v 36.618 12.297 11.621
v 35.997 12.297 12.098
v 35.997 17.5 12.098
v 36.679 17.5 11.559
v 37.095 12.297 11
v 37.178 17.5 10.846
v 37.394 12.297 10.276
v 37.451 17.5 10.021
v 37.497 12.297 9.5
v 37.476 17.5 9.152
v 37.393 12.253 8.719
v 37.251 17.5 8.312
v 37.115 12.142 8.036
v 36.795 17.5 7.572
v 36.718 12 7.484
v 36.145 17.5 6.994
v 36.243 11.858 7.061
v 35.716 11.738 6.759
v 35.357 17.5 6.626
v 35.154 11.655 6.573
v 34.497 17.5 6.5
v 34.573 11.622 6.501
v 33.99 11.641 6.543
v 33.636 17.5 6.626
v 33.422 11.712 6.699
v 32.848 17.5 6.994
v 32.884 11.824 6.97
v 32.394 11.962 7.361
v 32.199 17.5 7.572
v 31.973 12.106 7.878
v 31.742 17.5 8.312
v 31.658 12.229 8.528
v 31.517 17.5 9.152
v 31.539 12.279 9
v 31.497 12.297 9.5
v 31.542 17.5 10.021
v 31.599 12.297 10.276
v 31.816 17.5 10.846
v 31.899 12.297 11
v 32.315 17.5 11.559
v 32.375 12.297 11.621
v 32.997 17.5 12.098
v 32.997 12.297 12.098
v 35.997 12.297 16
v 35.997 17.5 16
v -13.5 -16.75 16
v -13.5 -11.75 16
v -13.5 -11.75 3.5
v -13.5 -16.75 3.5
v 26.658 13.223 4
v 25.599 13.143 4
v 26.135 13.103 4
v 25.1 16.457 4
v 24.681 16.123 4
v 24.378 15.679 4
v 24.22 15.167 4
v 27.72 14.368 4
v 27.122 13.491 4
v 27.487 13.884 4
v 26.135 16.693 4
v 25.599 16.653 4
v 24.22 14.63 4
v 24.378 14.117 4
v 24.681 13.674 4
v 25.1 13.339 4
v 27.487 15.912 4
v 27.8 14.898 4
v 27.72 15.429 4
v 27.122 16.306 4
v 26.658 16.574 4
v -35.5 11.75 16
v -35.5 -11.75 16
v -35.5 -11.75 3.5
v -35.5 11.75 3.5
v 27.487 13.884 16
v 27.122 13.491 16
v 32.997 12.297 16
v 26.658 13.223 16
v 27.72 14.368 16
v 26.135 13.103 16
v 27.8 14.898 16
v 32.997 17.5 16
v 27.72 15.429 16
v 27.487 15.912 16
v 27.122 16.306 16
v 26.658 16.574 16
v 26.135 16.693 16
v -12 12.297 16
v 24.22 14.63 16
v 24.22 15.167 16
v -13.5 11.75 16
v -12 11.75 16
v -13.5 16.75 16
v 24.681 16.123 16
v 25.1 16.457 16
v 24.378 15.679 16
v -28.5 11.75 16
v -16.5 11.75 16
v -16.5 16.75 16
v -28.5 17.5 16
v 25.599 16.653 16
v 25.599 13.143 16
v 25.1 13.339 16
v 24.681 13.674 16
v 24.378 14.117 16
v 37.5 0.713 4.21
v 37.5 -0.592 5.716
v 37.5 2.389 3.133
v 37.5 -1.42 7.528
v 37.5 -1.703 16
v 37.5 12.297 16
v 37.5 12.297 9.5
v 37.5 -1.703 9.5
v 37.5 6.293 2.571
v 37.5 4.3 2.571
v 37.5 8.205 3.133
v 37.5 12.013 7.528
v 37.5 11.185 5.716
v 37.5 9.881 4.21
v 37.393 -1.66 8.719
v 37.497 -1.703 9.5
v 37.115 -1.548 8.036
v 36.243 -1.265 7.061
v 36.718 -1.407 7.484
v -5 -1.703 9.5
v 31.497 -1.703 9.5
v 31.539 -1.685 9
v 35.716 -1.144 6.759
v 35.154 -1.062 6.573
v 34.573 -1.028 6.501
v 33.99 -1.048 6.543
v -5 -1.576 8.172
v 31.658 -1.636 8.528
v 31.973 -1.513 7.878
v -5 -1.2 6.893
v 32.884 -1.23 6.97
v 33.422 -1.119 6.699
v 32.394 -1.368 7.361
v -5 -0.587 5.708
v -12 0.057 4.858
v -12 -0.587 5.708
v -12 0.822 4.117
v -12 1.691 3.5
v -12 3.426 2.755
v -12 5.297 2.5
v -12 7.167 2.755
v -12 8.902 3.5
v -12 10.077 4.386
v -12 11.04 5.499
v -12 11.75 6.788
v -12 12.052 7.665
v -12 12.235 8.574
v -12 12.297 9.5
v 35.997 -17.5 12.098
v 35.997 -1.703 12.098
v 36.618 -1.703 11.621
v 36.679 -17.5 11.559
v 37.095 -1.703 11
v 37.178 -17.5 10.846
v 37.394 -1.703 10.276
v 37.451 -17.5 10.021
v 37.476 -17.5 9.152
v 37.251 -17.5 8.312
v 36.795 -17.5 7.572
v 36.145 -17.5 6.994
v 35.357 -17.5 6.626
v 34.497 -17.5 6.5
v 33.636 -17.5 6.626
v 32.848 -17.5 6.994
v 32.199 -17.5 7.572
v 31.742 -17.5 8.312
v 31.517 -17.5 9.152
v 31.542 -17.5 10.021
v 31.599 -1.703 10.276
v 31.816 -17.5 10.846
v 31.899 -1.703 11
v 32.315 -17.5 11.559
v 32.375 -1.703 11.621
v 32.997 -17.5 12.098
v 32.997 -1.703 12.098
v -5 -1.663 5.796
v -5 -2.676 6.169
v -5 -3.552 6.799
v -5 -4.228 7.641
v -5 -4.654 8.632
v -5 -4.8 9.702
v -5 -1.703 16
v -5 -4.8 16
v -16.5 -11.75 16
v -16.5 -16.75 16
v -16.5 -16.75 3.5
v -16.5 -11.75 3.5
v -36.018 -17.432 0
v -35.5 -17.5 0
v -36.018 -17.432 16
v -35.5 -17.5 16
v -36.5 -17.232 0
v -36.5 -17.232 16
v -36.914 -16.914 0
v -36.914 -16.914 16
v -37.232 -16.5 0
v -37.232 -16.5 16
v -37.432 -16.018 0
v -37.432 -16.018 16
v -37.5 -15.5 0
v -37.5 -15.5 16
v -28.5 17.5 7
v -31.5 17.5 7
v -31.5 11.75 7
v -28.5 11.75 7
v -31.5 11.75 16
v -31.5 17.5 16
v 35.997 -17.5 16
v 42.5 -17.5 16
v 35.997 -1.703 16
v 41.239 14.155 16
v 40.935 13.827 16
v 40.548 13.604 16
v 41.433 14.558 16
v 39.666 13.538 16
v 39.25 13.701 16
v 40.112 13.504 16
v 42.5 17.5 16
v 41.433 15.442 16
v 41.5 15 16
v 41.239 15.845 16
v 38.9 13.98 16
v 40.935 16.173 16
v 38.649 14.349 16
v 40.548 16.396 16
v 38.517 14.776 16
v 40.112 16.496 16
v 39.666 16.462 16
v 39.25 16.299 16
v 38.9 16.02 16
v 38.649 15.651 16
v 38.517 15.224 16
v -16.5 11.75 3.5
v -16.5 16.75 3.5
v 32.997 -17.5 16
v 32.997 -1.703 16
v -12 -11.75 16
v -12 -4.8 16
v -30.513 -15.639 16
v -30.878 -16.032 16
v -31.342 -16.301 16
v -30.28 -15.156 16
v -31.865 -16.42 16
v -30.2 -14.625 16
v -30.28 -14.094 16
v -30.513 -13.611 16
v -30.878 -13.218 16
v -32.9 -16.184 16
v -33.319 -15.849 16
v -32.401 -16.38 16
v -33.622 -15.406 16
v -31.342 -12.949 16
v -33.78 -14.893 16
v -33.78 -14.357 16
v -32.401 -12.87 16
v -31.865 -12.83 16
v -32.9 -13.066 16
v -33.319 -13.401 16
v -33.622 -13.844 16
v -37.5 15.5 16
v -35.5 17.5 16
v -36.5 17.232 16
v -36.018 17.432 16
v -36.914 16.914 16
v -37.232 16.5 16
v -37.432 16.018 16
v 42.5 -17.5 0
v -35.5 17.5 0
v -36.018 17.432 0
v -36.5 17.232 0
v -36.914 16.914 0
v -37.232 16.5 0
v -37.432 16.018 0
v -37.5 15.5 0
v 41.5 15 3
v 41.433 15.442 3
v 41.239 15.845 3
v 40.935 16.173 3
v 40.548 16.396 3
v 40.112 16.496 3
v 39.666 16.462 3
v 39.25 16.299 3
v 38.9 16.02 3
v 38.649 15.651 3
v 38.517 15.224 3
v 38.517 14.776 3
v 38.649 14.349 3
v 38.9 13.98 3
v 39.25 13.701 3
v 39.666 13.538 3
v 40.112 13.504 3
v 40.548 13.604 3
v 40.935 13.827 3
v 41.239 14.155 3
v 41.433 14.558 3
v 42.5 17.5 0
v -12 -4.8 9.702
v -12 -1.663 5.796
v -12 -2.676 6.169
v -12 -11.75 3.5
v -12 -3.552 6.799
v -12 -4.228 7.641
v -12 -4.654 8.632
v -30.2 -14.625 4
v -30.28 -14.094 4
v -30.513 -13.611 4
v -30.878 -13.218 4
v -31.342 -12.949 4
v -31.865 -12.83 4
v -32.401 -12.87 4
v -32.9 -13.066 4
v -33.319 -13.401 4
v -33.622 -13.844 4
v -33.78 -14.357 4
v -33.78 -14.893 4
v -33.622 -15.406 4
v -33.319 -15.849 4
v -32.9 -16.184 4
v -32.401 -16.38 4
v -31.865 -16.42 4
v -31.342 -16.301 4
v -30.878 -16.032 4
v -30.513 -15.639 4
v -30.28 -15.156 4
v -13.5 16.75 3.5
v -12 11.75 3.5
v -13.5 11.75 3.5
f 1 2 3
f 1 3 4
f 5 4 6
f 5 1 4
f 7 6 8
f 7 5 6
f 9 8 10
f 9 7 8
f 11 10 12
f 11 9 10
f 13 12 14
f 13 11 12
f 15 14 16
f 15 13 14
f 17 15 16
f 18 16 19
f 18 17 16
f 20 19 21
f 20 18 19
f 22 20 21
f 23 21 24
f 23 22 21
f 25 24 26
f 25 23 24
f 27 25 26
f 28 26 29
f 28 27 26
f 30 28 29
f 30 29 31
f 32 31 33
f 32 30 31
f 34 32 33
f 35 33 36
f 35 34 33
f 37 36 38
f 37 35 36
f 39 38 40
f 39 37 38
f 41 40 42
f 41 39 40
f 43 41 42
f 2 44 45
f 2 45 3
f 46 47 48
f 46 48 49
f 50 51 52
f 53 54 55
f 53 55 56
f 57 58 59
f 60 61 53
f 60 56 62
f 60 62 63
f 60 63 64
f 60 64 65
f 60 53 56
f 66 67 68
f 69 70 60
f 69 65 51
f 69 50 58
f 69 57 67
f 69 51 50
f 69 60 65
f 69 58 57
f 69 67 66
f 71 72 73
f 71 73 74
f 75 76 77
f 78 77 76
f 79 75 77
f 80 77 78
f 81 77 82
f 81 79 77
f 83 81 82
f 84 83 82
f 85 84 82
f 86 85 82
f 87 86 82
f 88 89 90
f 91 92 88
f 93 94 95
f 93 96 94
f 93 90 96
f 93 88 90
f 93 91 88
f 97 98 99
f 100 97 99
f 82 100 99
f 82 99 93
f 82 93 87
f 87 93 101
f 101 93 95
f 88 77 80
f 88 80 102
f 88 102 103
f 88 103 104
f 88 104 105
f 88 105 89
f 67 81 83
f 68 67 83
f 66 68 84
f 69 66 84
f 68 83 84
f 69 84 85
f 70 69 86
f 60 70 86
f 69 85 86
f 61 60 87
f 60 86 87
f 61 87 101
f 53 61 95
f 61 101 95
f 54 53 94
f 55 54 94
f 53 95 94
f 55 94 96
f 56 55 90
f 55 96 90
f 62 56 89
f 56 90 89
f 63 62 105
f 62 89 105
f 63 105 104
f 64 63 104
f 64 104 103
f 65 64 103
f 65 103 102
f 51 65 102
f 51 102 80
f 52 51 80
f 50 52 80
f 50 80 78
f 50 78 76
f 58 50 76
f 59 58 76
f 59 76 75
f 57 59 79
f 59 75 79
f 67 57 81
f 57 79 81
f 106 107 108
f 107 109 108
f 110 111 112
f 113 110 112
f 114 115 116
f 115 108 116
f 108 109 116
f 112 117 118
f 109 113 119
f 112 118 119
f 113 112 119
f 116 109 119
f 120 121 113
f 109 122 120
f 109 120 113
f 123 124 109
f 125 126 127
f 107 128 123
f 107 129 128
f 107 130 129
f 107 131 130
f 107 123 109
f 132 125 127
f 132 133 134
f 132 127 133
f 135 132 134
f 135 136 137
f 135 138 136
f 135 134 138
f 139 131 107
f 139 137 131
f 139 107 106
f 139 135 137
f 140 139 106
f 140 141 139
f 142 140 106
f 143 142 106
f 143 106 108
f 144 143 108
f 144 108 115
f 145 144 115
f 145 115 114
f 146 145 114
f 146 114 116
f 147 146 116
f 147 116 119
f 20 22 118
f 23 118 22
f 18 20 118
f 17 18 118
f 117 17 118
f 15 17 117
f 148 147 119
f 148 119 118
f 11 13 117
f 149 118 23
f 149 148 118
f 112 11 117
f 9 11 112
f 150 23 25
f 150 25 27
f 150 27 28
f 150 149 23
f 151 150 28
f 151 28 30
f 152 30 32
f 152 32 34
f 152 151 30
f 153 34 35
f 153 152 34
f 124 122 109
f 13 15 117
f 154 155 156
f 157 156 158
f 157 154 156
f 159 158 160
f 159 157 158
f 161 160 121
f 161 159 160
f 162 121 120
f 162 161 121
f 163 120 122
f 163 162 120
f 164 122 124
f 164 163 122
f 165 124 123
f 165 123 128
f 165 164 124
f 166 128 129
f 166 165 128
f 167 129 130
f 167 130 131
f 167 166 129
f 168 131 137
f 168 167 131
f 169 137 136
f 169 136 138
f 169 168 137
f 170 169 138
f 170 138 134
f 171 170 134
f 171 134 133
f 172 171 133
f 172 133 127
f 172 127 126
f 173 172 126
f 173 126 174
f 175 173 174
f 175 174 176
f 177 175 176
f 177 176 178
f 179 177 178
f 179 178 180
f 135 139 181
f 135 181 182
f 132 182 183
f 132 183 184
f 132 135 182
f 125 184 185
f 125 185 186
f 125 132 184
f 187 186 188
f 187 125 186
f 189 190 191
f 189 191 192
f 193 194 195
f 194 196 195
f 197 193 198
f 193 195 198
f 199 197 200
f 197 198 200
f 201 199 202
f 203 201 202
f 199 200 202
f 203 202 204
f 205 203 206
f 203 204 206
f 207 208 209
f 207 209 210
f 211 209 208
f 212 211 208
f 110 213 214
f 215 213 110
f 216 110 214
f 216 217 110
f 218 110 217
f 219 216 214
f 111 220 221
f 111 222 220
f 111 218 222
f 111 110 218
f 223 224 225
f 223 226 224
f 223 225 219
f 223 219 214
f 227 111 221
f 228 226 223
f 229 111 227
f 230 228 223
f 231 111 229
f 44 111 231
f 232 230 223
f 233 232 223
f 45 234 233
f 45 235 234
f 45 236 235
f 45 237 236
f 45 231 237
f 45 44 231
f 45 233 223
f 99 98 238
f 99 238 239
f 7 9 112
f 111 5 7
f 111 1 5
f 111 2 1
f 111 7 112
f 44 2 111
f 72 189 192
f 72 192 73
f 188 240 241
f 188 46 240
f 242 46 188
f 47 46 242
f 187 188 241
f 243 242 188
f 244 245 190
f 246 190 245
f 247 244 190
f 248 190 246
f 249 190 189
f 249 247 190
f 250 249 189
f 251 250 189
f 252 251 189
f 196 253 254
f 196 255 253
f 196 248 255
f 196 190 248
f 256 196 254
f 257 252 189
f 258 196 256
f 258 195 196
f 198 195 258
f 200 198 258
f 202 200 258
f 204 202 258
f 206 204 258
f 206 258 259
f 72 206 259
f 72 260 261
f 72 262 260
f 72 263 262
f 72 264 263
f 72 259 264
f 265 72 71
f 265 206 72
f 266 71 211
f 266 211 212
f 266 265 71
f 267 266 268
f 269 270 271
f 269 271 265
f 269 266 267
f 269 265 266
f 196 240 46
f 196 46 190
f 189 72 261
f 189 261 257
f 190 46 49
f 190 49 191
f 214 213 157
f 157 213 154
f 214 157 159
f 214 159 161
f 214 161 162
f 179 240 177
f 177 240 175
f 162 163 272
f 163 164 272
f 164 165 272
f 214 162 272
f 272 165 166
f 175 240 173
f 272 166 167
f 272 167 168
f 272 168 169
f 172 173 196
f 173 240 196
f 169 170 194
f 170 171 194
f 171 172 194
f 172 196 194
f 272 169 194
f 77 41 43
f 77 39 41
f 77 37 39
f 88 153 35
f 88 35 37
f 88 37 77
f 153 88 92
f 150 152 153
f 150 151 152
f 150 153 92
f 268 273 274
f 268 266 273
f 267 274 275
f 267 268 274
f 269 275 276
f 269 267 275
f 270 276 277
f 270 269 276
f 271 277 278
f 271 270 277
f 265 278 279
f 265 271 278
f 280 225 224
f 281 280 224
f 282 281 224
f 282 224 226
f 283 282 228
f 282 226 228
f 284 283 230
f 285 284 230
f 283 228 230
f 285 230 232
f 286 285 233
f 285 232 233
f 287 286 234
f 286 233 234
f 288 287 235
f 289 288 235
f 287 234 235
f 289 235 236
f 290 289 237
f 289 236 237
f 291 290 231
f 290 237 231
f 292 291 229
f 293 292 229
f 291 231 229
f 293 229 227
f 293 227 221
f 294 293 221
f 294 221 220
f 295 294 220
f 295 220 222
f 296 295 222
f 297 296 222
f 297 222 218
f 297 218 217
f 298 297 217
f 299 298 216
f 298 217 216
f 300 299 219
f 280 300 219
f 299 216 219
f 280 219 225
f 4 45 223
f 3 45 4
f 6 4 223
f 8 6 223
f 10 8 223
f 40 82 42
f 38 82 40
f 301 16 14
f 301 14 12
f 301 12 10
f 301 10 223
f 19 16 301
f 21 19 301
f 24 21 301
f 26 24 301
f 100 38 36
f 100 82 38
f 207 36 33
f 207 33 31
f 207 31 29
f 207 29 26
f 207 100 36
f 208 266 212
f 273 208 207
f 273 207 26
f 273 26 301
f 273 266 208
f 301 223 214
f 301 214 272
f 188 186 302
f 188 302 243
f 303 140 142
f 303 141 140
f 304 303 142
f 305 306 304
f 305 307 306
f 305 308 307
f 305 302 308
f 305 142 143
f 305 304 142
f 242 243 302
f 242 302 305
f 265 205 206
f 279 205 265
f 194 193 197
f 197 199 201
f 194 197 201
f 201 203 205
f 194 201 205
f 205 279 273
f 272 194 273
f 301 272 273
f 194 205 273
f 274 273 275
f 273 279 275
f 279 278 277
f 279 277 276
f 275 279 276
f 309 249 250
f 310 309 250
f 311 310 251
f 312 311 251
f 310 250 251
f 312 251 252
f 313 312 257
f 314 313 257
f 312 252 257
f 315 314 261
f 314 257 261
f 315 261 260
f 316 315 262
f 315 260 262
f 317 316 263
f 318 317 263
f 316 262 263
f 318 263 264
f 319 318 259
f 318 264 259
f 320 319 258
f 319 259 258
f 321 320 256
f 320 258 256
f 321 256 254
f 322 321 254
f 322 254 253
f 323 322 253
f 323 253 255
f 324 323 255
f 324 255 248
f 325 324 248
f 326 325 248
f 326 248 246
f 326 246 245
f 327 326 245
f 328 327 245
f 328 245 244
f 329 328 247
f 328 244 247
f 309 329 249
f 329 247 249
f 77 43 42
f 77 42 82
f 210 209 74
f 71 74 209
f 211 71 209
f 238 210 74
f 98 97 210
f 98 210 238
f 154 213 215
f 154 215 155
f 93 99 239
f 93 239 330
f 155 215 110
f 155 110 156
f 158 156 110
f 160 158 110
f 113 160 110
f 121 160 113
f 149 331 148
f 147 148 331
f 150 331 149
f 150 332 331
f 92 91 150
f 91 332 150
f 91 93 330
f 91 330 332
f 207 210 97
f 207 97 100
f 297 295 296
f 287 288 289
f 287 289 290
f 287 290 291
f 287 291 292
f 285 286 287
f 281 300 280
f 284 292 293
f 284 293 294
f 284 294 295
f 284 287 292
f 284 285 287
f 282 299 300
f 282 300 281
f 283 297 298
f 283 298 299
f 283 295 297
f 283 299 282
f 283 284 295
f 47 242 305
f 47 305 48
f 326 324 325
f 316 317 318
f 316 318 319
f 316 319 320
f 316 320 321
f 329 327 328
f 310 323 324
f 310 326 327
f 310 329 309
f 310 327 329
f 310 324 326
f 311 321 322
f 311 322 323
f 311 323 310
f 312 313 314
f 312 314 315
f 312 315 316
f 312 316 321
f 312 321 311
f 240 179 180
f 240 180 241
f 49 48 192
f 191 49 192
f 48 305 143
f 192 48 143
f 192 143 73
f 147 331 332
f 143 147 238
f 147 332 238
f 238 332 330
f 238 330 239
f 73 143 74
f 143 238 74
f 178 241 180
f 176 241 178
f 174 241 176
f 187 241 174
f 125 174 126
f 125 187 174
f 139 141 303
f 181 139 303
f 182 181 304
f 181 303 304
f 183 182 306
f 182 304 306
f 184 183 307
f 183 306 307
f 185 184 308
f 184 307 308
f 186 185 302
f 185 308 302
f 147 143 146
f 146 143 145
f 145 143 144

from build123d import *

# Parameters (mm, degrees)
SKETCH1_W           = 75
SKETCH1_H           = 35
BOSS_EXTRUDE5_DEPTH = 16
CUT_EXTRUDE1_DEPTH  = 12.5
CUT_EXTRUDE2_REACH  = 56.886
CUT_EXTRUDE3_DEPTH  = 7
SKETCH6_W           = 16
SKETCH6_H           = 35
BOSS_EXTRUDE6_DEPTH = 5
CUT_EXTRUDE4_DEPTH  = 58.334544561
SKETCH8_R           = 1.5
CUT_EXTRUDE5_DEPTH  = 13
SKETCH10_W          = 3
SKETCH10_H          = 5.75
CUT_EXTRUDE6_DEPTH  = 9
FILLET1_R           = 2
SKETCH11_R          = 1.8
CUT_EXTRUDE7_DEPTH  = 12


with BuildPart() as part:
    # Sketch1 → Boss-Extrude5 (new body)
    with BuildSketch(Plane.XY):
        Rectangle(SKETCH1_W, SKETCH1_H)
    extrude(amount=BOSS_EXTRUDE5_DEPTH)

    # Sketch2 → Cut-Extrude1 (cut)
    with BuildSketch(Plane.XY.offset(16)):
        Polygon((-35.5, 11.75), (-16.5, 11.75), (-16.5, 16.75), (-13.5, 16.75), (-13.5, 11.75), (-12, 11.75), (-12, -11.75), (-13.5, -11.75), (-13.5, -16.75), (-16.5, -16.75), (-16.5, -11.75), (-35.5, -11.75), align=None)
    extrude(amount=-CUT_EXTRUDE1_DEPTH, mode=Mode.SUBTRACT)

    # Sketch3 → Cut-Extrude2 (cut, up to next)
    with BuildSketch(Plane.ZY.offset(12), mode=Mode.PRIVATE) as cut_extrude2_sk1:
        with BuildLine():
            Line((9.5, 12.296655642), (16, 12.296655642))
            Line((16, 12.296655642), (16, -1.703344358))
            Line((16, -1.703344358), (9.5, -1.703344358))
            ThreePointArc((9.5, -1.703344358), (2.5, 5.296655642), (9.5, 12.296655642))
        make_face()
    cut_extrude2_tool1 = extrude(cut_extrude2_sk1.sketch, amount=-CUT_EXTRUDE2_REACH, mode=Mode.PRIVATE) & part.part
    add(cut_extrude2_tool1.solids().sort_by_distance((-12, 5.296656, 9.899379))[0], mode=Mode.SUBTRACT)

    # Sketch5 → Cut-Extrude3 (cut)
    with BuildSketch(Plane.ZY.offset(12)):
        with BuildLine():
            Line((9.702025117, -4.799998018), (16, -4.799998018))
            Line((16, -4.799998018), (16, 3.200001982))
            Line((16, 3.200001982), (9.702025117, 3.200001982))
            ThreePointArc((9.702025117, 3.200001982), (5.702025117, -0.799998018), (9.702025117, -4.799998018))
        make_face()
    extrude(amount=-CUT_EXTRUDE3_DEPTH, mode=Mode.SUBTRACT)

    # Sketch6 → Boss-Extrude6 (add)
    with BuildSketch(Plane(origin=(37.5, 0, 0), x_dir=(0, 0, -1), z_dir=(1, 0, 0))):
        with Locations((-8, 0)):
            Rectangle(SKETCH6_W, SKETCH6_H)
    extrude(amount=BOSS_EXTRUDE6_DEPTH)

    # Sketch7 → Cut-Extrude4 (cut, through all)
    with BuildSketch(Plane.XZ.offset(17.5)):
        with BuildLine():
            Line((32.99668066, 12.098076211), (32.99668066, 16))
            Line((32.99668066, 16), (35.99668066, 16))
            Line((35.99668066, 16), (35.99668066, 12.098076211))
            ThreePointArc((35.99668066, 12.098076211), (34.49668066, 6.5), (32.99668066, 12.098076211))
        make_face()
    extrude(amount=-CUT_EXTRUDE4_DEPTH, mode=Mode.SUBTRACT)

    # Sketch8 → Cut-Extrude5 (cut)
    with BuildSketch(Plane.XY.offset(16)):
        with Locations((40, 15)):
            Circle(SKETCH8_R)
    extrude(amount=-CUT_EXTRUDE5_DEPTH, mode=Mode.SUBTRACT)

    # Sketch10 → Cut-Extrude6 (cut)
    with BuildSketch(Plane.XY.offset(16)):
        with Locations((-30, 14.625)):
            Rectangle(SKETCH10_W, SKETCH10_H)
    extrude(amount=-CUT_EXTRUDE6_DEPTH, mode=Mode.SUBTRACT)

    # Fillet1
    fillet1_edges = [part.edges().sort_by_distance(p)[0] for p in [
        (-37.5, -17.5, 8),
        (-37.5, 17.5, 8),
    ]]
    fillet(fillet1_edges, radius=FILLET1_R)

    # Sketch11 → Cut-Extrude7 (cut)
    with BuildSketch(Plane.XY.offset(16)):
        with Locations((-32, -14.625)):
            Circle(SKETCH11_R)
        with Locations((26, 14.898327821)):
            Circle(SKETCH11_R)
    extrude(amount=-CUT_EXTRUDE7_DEPTH, mode=Mode.SUBTRACT)


solid = part.part
